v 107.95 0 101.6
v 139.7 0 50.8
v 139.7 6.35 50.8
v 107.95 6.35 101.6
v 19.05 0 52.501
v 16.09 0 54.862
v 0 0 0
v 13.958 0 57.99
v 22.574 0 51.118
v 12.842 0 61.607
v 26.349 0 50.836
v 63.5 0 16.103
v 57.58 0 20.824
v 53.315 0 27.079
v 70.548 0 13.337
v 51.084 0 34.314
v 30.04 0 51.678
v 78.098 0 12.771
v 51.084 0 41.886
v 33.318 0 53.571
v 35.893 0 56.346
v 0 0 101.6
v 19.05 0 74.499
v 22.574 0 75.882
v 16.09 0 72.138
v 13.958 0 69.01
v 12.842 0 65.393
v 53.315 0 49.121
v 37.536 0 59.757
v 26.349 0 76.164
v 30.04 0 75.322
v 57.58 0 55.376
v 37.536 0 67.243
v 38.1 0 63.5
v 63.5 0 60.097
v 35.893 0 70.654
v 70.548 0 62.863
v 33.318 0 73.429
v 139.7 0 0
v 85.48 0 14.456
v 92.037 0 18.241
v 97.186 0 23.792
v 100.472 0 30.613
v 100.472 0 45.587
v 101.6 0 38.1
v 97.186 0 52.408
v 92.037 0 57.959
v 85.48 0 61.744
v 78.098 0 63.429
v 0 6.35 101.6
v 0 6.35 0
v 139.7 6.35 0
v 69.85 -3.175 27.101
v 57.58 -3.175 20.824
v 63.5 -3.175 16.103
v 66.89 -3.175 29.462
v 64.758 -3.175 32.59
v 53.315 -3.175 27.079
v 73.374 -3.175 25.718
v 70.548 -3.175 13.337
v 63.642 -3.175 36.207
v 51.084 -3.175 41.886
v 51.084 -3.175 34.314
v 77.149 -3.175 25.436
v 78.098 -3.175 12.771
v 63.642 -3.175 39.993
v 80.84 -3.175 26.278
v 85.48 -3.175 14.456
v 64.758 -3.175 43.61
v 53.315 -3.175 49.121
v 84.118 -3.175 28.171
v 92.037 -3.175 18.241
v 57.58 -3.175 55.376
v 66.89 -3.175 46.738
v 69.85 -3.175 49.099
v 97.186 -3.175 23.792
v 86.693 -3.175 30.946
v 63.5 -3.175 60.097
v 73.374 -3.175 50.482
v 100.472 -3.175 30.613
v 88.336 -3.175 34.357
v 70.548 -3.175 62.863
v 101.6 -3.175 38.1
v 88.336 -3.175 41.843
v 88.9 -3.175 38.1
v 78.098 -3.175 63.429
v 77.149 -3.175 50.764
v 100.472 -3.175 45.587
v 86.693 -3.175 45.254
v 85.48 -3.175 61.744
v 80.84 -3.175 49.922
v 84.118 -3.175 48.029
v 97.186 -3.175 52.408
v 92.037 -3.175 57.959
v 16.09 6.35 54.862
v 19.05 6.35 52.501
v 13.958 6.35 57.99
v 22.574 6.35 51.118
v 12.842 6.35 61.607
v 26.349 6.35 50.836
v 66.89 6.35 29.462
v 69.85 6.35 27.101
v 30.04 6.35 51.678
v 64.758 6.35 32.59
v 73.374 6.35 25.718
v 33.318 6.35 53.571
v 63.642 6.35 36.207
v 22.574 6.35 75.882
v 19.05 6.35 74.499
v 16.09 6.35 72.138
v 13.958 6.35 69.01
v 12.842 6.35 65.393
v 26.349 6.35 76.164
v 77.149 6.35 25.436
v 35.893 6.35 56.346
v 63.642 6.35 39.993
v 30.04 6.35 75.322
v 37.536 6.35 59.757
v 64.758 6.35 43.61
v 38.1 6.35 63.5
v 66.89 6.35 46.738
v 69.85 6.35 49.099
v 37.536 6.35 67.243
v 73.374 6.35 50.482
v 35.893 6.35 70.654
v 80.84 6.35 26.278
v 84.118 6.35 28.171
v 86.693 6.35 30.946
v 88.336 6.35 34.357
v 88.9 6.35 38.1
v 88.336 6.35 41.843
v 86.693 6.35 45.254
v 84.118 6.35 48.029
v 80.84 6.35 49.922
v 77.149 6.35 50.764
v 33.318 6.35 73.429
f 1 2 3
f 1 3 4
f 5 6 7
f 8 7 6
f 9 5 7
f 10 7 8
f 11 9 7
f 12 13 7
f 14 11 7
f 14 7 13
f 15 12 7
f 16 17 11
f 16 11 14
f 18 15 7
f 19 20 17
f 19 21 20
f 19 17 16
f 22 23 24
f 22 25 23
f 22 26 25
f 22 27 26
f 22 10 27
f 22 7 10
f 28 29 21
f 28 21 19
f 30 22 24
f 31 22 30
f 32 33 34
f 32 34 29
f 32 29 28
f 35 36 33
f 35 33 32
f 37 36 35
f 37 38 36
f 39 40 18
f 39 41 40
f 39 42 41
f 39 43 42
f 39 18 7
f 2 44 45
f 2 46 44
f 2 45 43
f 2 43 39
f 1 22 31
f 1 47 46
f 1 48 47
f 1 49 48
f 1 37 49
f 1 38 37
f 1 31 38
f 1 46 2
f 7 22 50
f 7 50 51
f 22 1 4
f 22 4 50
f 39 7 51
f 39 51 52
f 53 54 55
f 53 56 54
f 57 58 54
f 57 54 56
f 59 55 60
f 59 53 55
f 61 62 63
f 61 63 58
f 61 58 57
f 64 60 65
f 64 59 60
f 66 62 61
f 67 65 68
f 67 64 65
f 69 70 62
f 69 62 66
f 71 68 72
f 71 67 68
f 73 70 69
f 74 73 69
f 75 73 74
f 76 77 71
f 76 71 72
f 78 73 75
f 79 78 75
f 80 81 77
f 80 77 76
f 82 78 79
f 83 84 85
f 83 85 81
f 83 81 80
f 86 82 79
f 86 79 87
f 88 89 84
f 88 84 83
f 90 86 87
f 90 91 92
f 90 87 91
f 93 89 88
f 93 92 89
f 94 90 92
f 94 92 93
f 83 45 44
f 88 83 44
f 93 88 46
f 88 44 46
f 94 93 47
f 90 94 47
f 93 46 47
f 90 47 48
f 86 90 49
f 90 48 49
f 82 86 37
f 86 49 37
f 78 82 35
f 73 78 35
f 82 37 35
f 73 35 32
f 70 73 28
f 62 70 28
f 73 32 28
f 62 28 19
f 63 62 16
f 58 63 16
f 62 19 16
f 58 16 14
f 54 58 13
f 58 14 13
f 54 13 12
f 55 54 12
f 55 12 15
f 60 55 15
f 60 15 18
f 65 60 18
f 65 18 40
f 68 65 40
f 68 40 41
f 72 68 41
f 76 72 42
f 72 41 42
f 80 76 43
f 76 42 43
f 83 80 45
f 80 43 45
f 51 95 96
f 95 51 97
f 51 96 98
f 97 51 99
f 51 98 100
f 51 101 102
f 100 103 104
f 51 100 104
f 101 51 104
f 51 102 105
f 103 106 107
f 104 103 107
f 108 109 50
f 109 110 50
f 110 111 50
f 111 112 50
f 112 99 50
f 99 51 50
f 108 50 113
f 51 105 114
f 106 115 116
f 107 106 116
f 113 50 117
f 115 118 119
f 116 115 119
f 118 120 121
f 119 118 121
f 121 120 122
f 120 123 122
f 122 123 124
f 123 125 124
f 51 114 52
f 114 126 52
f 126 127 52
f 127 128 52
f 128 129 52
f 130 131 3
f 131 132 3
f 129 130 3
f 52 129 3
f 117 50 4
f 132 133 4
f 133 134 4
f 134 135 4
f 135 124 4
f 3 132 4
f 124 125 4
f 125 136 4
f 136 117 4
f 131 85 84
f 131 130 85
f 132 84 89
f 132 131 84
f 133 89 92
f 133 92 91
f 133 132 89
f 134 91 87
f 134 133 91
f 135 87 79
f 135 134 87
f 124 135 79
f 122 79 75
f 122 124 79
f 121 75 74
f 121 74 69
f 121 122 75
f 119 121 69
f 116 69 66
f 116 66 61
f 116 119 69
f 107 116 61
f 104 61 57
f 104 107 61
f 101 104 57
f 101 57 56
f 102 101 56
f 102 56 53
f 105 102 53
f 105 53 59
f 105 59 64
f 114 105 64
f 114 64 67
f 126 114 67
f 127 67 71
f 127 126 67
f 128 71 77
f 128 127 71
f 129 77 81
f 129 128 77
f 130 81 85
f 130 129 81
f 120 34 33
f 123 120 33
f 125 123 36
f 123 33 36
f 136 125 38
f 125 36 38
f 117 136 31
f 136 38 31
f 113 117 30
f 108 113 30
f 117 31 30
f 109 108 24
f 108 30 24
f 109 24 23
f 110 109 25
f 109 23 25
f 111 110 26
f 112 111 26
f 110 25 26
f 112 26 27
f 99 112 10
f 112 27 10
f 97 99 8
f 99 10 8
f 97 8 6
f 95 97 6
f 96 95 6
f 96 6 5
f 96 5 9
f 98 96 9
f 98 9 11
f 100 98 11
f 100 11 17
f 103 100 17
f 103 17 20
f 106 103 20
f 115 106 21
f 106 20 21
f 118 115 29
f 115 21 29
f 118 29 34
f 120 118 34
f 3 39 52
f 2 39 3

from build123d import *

# Parameters (mm, degrees)
F0_R     = 25.4
F0_R_2   = 12.7
F1_DEPTH = 6.35
F2_DEPTH = 3.175


with BuildPart() as f1:
    # F0 (on Front) → F1 (new body)
    with BuildSketch(Plane.XZ):
        Polygon((0, 38.1), (0, 0), (25.4, 0), (76.2, 0), (139.7, 0), (139.7, 50.8), (107.95, 101.6), (0, 101.6), (0, 63.5), align=None)
        with Locations((76.2, 38.1)):
            Circle(F0_R, mode=Mode.SUBTRACT)
        with Locations((25.4, 63.5)):
            Circle(F0_R_2, mode=Mode.SUBTRACT)
        with Locations((76.2, 38.1)):
            Circle(F0_R)
        with Locations((76.2, 38.1)):
            Circle(F0_R_2, mode=Mode.SUBTRACT)
    extrude(amount=-F1_DEPTH)

    # F0 (on Front) → F2 (join)
    with BuildSketch(Plane.XZ):
        with Locations((76.2, 38.1)):
            Circle(F0_R)
        with Locations((76.2, 38.1)):
            Circle(F0_R_2, mode=Mode.SUBTRACT)
    extrude(amount=F2_DEPTH)


solid = f1.part
